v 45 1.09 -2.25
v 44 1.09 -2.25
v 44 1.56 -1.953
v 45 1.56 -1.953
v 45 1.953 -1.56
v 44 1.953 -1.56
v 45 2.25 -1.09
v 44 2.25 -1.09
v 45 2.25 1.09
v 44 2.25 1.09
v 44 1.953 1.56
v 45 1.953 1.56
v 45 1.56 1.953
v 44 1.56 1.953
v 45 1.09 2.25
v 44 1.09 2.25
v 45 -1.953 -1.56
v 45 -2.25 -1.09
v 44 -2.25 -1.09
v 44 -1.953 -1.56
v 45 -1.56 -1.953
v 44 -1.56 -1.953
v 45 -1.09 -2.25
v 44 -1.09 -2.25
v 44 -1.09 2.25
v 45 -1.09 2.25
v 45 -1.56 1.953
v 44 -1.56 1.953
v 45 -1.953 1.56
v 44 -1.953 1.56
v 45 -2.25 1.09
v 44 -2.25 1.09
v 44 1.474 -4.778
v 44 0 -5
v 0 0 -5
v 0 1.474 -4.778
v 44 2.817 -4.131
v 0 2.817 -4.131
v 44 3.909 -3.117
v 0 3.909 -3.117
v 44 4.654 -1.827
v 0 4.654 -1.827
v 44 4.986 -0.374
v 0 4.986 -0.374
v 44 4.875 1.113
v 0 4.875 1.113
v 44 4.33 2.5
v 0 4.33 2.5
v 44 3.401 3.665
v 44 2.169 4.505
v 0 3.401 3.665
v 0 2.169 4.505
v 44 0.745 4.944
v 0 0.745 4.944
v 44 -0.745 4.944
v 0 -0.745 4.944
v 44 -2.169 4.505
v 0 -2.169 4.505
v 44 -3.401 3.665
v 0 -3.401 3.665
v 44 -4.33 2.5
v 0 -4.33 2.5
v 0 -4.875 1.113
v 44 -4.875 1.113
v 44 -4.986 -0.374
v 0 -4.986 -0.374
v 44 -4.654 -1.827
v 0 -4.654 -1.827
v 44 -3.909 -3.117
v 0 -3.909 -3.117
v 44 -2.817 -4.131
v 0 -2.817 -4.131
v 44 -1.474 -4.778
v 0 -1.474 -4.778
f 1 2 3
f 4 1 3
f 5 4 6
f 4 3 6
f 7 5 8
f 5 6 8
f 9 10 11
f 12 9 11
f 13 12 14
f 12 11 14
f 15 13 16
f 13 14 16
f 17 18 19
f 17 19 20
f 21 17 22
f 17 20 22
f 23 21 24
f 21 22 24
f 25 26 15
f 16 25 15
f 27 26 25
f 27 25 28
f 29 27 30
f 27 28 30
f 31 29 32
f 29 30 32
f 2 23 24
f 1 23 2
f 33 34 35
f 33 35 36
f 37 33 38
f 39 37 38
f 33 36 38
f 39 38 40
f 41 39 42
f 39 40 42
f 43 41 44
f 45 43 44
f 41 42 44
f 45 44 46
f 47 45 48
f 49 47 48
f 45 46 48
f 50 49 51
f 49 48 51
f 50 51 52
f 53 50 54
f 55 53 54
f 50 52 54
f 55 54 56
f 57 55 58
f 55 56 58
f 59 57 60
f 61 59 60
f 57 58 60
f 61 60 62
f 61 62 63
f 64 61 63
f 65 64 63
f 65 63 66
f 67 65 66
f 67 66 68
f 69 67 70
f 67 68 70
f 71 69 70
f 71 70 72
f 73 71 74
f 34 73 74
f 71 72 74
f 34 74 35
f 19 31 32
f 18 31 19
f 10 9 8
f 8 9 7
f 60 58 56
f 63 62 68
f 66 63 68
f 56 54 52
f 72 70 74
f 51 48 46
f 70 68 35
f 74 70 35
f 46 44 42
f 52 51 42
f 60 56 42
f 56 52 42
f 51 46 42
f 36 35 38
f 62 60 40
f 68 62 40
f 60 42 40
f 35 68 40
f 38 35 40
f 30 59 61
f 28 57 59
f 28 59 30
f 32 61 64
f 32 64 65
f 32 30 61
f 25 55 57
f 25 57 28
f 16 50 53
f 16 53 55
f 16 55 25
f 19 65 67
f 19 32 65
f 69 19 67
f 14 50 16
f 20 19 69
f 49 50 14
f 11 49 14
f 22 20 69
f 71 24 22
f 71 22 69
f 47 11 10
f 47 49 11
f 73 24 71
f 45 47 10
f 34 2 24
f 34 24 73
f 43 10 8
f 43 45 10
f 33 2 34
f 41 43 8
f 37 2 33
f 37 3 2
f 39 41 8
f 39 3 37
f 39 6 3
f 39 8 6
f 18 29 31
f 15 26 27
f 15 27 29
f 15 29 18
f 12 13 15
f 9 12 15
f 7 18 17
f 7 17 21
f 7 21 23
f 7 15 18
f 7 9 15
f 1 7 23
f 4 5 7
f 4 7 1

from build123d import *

# Parameters (mm, degrees)
SKETCH1_R           = 5
BOSS_EXTRUDE1_DEPTH = 44
SKETCH2_R           = 2.5
BOSS_EXTRUDE2_DEPTH = 1
SKETCH3_OUTSIDE_W   = 21.434
SKETCH3_OUTSIDE_H   = 21.434
SKETCH3_OUTSIDE_W_2 = 4.5
SKETCH3_OUTSIDE_H_2 = 4.5
CUT_EXTRUDE1_DEPTH  = 1


with BuildPart() as part:
    # Sketch1 → Boss-Extrude1 (new body)
    with BuildSketch(Plane(origin=(0, 0, 0), x_dir=(0, 0, -1), z_dir=(1, 0, 0))):
        Circle(SKETCH1_R)
    extrude(amount=BOSS_EXTRUDE1_DEPTH)

    # Sketch2 → Boss-Extrude2 (add)
    with BuildSketch(Plane(origin=(44, 0, 0), x_dir=(0, 0, -1), z_dir=(1, 0, 0))):
        Circle(SKETCH2_R)
    extrude(amount=BOSS_EXTRUDE2_DEPTH)

    # Sketch3 outside → Cut-Extrude1 (cut)
    with BuildSketch(Plane(origin=(45, 0, 0), x_dir=(0, 0, -1), z_dir=(1, 0, 0))):
        Rectangle(SKETCH3_OUTSIDE_W, SKETCH3_OUTSIDE_H)
        Rectangle(SKETCH3_OUTSIDE_W_2, SKETCH3_OUTSIDE_H_2, mode=Mode.SUBTRACT)
    extrude(amount=-CUT_EXTRUDE1_DEPTH, mode=Mode.SUBTRACT)


solid = part.part
